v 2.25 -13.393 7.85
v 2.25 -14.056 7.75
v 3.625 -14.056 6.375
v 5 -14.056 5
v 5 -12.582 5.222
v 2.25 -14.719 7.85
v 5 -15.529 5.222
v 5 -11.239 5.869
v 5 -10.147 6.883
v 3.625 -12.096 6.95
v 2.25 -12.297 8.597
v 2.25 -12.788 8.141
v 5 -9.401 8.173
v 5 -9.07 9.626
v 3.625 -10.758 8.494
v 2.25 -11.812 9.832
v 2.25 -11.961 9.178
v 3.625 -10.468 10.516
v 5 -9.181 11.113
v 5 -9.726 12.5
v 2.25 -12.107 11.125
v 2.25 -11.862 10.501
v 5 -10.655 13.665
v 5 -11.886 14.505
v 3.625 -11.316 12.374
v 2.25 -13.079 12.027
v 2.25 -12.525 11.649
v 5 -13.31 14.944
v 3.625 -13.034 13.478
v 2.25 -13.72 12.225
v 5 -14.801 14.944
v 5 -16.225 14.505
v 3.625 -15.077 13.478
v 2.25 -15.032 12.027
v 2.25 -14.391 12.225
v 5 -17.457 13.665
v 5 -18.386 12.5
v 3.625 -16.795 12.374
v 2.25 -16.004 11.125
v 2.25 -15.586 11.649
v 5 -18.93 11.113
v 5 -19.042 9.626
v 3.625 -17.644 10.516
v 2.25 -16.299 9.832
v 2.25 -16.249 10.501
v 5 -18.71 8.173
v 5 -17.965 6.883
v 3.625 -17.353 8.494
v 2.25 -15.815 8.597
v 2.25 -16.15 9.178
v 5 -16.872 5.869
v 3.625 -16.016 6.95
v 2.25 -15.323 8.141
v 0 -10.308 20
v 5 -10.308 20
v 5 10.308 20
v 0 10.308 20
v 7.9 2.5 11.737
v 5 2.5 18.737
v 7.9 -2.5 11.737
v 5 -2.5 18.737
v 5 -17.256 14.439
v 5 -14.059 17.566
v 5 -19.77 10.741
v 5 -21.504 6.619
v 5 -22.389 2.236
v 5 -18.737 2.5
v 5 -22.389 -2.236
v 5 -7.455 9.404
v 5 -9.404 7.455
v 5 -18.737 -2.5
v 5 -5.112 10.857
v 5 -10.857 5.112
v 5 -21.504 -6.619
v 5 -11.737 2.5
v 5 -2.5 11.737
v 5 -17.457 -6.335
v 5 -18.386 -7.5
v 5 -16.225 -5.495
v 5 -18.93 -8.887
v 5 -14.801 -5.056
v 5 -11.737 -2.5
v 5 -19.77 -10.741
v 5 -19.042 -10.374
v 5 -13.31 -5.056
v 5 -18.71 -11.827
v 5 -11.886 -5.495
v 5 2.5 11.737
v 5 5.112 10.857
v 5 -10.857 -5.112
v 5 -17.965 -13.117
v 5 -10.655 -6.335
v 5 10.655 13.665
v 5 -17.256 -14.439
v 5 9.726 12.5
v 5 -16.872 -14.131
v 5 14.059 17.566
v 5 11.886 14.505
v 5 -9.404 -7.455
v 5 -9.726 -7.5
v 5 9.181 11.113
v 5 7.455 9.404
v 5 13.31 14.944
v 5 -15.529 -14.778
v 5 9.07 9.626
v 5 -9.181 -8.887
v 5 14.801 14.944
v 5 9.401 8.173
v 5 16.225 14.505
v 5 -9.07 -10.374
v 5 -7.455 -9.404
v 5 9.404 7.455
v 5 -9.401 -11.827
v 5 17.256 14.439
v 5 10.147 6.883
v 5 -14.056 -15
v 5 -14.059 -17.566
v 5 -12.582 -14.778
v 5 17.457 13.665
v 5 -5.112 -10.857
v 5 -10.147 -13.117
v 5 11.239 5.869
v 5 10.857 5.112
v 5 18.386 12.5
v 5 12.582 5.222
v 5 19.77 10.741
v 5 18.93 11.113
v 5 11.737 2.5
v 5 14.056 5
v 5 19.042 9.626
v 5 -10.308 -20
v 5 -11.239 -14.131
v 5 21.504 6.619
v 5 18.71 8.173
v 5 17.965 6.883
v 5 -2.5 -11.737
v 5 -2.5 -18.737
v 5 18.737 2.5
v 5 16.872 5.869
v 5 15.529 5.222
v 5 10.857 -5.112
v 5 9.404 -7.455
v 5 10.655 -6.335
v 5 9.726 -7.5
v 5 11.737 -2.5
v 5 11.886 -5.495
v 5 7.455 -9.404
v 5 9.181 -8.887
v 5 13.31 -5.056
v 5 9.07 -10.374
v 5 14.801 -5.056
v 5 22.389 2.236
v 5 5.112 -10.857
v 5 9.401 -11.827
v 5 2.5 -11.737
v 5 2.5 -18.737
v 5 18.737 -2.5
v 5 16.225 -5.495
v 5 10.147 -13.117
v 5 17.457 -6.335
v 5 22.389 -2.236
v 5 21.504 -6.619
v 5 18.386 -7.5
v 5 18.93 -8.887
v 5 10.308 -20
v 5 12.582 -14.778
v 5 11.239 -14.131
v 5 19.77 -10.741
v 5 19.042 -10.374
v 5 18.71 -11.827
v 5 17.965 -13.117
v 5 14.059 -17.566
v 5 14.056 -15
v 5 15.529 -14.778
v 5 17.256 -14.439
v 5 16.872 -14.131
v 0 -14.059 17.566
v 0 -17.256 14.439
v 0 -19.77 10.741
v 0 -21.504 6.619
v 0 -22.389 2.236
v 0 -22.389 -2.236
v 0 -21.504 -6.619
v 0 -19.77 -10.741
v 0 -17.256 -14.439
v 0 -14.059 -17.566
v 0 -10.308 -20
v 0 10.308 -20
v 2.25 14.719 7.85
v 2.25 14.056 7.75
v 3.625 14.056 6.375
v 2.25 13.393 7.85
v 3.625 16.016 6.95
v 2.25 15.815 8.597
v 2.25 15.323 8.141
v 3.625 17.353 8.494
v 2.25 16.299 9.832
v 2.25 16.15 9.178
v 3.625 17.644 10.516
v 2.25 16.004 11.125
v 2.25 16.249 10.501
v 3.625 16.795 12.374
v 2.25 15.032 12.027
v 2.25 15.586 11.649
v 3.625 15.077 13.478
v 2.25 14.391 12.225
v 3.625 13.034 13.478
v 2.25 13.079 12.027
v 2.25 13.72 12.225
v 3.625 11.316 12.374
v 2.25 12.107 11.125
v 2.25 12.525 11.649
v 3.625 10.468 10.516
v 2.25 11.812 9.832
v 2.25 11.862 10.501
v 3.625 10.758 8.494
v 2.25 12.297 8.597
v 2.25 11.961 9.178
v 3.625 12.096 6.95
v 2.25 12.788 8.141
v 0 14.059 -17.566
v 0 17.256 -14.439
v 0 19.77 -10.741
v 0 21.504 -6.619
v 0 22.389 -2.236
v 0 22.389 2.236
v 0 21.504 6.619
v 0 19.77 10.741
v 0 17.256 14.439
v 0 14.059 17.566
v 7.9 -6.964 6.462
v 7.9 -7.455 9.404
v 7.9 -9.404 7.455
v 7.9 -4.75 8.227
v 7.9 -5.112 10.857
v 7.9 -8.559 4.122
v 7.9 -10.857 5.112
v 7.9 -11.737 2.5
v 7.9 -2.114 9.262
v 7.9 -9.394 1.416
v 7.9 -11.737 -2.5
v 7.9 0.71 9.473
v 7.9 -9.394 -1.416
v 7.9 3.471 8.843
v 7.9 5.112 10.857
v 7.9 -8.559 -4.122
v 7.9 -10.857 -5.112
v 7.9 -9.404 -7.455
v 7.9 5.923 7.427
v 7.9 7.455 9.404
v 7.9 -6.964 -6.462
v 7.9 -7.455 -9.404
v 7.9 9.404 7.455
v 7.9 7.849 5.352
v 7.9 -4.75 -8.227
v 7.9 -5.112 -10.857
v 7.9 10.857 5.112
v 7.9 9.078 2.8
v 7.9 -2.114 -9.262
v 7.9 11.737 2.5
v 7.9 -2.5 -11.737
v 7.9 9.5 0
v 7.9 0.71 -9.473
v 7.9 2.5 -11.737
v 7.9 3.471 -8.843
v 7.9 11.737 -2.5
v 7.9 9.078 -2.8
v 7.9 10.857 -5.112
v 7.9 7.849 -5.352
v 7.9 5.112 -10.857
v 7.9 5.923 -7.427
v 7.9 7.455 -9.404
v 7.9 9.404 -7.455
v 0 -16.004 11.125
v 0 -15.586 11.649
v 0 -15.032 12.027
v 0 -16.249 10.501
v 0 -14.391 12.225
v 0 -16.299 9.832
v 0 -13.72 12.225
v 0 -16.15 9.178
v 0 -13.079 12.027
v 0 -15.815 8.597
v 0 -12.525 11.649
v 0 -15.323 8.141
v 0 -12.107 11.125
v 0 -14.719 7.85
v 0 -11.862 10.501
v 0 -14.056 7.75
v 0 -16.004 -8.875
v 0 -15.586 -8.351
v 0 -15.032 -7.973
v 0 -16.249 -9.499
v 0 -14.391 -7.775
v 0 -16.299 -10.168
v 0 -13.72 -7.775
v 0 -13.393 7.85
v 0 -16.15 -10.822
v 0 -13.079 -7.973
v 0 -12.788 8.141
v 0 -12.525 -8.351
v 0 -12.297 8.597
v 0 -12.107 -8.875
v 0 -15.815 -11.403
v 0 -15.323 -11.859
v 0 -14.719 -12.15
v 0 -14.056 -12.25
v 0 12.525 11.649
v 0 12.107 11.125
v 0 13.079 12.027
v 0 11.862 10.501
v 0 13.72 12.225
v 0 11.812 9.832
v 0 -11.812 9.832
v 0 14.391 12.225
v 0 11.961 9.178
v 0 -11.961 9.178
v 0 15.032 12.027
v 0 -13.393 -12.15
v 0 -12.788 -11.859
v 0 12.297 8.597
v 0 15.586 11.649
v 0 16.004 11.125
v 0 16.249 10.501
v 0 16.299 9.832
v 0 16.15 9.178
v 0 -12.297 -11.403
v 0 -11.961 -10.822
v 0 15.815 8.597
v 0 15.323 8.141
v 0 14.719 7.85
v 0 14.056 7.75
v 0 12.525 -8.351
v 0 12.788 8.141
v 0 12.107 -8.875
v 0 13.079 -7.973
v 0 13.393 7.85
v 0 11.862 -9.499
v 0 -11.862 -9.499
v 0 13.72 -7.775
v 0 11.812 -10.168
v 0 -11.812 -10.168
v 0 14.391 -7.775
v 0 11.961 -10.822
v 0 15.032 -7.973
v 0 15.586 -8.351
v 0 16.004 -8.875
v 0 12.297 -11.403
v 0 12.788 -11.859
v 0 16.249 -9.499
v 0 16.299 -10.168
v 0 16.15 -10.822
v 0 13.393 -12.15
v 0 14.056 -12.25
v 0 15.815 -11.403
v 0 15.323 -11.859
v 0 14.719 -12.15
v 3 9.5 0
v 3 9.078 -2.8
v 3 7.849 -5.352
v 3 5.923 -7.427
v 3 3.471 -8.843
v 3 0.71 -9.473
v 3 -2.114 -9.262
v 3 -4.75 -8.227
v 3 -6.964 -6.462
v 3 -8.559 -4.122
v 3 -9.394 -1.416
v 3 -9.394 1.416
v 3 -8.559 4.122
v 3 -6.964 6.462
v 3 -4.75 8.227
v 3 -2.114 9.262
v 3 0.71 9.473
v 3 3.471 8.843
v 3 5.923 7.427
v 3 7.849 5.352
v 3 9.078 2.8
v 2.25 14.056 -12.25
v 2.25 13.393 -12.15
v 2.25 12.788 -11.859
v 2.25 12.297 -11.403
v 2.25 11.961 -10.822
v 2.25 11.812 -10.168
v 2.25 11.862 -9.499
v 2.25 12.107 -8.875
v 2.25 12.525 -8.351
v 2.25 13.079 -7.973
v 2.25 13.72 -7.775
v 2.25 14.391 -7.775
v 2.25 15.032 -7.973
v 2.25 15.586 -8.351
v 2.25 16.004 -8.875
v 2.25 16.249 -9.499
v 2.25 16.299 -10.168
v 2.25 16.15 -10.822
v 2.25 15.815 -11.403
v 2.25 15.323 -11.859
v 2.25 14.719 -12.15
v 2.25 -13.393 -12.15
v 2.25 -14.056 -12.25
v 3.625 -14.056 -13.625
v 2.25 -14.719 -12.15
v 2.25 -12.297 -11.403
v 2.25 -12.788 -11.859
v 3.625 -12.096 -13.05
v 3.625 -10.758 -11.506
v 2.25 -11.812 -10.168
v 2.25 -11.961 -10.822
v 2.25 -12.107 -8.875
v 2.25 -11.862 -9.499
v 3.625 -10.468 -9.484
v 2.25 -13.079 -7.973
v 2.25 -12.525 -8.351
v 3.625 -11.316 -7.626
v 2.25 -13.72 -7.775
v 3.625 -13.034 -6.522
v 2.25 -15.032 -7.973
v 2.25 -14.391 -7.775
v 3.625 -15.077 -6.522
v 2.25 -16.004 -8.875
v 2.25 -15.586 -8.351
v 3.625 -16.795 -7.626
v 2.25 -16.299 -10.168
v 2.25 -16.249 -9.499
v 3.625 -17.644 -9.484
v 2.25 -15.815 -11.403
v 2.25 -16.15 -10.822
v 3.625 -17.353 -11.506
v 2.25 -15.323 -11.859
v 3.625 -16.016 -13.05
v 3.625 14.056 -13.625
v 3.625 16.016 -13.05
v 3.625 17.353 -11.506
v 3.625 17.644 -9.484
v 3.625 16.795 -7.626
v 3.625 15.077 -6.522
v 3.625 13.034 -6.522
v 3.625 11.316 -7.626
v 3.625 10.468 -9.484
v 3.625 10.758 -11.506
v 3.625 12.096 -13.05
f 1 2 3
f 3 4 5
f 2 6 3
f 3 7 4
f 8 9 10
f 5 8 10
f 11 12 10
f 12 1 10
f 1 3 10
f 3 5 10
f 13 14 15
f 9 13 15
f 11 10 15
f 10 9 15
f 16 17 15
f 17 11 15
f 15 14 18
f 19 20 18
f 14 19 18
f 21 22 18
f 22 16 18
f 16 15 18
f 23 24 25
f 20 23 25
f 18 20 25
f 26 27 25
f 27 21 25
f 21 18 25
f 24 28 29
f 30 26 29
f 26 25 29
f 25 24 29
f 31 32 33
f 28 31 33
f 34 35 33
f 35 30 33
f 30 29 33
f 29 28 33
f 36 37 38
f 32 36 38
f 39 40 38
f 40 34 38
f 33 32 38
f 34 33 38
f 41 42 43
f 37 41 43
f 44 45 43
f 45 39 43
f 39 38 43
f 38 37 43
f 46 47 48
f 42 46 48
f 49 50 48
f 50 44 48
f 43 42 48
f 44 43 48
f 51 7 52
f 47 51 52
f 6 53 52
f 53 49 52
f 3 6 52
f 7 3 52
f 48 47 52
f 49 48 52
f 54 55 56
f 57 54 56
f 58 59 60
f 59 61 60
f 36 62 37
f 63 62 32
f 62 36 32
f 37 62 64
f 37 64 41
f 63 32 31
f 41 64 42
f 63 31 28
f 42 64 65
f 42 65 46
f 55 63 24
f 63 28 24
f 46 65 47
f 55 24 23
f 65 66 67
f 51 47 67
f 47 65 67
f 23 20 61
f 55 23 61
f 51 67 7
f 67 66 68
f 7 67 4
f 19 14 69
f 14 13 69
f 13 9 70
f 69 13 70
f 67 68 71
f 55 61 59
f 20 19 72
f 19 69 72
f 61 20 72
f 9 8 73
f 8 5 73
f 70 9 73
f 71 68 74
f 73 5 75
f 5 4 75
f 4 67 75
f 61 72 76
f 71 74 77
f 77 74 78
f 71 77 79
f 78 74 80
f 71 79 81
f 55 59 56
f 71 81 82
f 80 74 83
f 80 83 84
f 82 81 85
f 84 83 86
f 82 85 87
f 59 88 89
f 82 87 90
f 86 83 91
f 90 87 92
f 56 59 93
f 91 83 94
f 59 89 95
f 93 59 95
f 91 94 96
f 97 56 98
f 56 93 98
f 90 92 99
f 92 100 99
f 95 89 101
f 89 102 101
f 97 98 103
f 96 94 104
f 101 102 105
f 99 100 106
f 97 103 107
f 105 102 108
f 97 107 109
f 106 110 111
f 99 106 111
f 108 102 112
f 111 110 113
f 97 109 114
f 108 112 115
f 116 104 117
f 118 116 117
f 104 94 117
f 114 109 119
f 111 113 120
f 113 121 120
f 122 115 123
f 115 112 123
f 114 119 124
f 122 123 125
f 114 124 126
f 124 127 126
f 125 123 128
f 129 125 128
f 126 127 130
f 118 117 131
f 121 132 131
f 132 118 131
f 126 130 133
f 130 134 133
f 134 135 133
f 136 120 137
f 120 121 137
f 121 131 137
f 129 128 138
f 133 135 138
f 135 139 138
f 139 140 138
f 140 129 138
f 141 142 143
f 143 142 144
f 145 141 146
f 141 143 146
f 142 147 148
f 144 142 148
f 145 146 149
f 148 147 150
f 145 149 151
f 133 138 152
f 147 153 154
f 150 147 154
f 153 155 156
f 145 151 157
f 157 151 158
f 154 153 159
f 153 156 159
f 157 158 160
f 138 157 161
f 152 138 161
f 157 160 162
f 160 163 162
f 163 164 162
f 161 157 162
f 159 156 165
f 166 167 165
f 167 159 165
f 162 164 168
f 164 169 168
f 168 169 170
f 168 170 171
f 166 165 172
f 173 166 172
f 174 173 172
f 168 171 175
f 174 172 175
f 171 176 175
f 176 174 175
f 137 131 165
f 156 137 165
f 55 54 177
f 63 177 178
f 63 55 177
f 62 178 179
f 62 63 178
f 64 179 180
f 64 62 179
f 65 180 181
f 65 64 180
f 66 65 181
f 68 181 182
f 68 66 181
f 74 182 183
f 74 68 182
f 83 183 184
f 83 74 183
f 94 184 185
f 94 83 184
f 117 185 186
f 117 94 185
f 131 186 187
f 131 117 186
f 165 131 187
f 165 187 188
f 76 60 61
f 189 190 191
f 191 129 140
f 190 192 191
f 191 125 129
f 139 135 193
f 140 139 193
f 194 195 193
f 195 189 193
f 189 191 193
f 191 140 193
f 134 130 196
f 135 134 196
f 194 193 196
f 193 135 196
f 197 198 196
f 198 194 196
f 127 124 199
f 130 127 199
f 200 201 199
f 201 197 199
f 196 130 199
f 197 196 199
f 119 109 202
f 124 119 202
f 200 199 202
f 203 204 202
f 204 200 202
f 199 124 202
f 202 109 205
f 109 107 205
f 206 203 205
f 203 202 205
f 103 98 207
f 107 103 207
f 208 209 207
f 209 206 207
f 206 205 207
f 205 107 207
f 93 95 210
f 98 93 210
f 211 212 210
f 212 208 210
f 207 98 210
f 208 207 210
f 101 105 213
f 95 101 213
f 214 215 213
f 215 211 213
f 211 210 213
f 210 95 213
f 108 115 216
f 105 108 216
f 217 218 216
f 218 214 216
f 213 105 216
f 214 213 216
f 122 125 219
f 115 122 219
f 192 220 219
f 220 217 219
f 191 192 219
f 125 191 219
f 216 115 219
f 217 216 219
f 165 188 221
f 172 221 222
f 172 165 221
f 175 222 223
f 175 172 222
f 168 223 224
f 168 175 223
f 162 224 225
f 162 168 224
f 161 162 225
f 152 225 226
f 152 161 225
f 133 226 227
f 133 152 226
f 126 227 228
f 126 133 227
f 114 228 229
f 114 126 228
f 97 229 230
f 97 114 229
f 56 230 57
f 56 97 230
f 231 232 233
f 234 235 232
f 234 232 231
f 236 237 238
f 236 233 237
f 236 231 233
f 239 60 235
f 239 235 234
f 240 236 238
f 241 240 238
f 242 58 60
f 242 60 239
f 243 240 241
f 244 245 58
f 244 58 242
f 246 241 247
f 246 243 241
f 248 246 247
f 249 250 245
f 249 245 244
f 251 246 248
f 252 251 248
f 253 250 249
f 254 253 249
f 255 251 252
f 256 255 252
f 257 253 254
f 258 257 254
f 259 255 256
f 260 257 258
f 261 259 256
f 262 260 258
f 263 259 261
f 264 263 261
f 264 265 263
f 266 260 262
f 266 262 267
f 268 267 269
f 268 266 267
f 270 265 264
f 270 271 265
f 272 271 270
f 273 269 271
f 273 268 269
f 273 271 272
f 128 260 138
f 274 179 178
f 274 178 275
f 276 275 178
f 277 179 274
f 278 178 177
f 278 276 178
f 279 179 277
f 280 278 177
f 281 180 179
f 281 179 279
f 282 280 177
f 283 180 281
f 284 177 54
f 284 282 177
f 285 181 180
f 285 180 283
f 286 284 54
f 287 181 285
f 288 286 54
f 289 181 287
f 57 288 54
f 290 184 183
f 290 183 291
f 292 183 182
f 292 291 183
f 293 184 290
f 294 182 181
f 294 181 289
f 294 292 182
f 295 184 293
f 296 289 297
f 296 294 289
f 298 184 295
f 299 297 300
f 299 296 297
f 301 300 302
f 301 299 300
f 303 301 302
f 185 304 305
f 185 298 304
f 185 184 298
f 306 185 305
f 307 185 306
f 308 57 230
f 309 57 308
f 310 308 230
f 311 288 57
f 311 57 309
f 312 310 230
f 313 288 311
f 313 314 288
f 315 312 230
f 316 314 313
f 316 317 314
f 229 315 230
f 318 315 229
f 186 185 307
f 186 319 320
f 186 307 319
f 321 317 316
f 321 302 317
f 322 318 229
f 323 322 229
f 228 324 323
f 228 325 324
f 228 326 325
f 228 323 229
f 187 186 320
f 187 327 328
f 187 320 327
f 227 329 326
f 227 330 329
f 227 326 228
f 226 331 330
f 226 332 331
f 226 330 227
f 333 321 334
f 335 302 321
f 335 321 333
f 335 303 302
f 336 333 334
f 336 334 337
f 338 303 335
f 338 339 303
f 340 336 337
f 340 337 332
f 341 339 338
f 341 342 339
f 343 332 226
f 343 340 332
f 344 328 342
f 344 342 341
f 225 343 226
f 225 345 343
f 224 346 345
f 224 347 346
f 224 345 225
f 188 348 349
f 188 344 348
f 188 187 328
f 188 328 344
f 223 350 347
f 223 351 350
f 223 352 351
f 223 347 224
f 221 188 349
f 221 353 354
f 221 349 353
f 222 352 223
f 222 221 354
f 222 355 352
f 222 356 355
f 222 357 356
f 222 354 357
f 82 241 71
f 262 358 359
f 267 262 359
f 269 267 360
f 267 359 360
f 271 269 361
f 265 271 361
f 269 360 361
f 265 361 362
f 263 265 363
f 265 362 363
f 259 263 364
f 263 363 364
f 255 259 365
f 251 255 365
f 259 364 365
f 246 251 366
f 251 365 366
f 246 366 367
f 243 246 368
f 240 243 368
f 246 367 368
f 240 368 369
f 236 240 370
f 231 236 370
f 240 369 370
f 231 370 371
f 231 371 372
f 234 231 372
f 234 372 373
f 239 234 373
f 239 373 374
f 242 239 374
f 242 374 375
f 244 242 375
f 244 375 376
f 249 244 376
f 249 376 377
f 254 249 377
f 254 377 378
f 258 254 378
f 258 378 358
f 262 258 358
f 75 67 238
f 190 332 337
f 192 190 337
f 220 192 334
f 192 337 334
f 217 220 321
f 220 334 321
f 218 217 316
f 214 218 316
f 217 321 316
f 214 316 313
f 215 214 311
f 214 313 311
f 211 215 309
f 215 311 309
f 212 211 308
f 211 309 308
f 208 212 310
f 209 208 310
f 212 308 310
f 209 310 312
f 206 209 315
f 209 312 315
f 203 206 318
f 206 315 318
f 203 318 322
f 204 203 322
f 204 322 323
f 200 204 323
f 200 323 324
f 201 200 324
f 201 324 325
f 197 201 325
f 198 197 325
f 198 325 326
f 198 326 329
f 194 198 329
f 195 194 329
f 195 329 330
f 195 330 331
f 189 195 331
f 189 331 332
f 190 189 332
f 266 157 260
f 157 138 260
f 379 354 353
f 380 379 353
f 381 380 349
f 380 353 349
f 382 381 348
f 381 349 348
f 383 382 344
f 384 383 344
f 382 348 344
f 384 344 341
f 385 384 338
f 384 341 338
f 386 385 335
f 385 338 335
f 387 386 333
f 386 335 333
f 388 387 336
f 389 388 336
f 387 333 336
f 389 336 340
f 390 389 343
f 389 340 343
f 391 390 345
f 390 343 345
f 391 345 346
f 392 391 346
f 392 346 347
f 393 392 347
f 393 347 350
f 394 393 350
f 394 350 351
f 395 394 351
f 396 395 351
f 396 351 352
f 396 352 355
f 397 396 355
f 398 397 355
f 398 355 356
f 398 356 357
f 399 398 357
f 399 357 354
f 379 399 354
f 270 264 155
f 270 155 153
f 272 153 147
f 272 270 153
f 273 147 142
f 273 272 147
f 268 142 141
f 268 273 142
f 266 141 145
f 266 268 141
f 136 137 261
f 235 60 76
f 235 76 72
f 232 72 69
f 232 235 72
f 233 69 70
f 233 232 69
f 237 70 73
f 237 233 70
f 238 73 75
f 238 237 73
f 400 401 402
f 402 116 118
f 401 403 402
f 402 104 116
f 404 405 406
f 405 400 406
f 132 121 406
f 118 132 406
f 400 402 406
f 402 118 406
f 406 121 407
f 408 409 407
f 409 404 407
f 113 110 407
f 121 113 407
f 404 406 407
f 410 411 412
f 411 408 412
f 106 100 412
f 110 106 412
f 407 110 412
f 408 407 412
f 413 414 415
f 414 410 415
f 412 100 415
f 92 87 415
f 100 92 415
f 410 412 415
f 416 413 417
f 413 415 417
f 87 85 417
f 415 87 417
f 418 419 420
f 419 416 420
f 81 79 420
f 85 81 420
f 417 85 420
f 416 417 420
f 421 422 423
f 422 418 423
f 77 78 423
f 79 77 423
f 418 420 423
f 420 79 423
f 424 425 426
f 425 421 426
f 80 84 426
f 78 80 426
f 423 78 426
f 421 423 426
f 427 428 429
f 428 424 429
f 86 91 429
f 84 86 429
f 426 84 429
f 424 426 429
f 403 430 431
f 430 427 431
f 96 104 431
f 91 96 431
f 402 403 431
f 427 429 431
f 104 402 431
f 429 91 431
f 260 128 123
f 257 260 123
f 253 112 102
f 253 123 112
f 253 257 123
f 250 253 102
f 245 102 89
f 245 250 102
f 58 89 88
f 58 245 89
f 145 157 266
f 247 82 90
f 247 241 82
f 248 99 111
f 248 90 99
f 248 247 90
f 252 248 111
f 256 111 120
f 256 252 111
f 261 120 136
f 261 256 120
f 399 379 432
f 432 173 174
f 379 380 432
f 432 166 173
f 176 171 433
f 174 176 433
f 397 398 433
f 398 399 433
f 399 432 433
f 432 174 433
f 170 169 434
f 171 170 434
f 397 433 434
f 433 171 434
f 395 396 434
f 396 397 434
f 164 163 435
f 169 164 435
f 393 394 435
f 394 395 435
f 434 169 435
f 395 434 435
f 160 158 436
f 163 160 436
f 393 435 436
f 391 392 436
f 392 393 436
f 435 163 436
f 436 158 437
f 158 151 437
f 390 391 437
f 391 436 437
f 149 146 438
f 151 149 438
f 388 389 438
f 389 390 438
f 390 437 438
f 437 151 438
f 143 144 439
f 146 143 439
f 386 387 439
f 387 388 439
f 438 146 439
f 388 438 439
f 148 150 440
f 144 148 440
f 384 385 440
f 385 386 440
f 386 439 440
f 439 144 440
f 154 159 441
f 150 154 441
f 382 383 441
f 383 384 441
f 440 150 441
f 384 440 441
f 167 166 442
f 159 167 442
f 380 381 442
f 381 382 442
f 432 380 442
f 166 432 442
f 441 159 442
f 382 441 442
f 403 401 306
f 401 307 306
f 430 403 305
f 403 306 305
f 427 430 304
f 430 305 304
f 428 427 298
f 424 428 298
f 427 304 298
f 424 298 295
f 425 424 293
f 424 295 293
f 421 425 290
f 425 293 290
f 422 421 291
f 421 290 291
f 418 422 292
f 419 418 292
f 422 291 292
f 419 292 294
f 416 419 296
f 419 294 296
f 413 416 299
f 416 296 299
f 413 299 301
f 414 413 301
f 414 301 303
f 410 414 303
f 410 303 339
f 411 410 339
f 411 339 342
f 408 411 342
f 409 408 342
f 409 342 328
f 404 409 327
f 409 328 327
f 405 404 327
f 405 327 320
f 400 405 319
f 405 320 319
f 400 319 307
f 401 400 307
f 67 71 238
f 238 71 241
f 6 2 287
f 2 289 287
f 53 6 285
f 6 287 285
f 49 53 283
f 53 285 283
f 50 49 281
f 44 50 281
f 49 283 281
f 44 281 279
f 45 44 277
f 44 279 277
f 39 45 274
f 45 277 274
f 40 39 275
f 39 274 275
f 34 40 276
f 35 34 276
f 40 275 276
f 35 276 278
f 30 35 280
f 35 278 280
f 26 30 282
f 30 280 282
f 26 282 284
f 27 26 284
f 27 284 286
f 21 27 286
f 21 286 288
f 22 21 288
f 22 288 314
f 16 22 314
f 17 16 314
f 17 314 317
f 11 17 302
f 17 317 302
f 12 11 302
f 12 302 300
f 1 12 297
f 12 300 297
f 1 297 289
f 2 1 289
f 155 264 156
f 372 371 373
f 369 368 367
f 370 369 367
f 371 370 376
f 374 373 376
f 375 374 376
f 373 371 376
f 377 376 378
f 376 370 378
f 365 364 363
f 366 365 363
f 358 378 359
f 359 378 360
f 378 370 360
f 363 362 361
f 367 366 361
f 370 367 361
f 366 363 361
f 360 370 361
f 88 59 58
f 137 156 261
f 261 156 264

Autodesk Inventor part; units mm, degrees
ref_plane "YZ Plane" through (0, 0, 0) normal (1, 0, 0) x (0, 1, 0)
ref_plane "XZ Plane" through (0, 0, 0) normal (0, 1, 0) x (-1, 0, 0)
ref_plane "XY Plane" through (0, 0, 0) normal (0, 0, 1) x (1, 0, 0)
sketch "Skizze1" plane through (0, 0, 0) normal (0, 0, 1) x (1, 0, 0)
  line L0 (0, 0) -> (0, 22.5)
  line L1 (0, 22.5) -> (5, 22.5)
  line L2 (5, 22.5) -> (5, 12)
  line L3 (5, 12) -> (7.9, 12)
  line L4 (7.9, 12) -> (7.9, 9.5)
  line L5 (7.9, 9.5) -> (3, 9.5)
  line L6 (3, 9.5) -> (3, 0)
  line L7 (3, 0) -> (0, 0)
  line L8 (5, 17.25) -> (0, 17.25) construction
  line L9 (0, 18.75) -> (5, 18.75) construction
  line L10 (0, 15.75) -> (5, 15.75) construction
  line L11 (9, 12) -> (9, 0) construction
  line L12 (5, 12) -> (5, 0) construction
  dimension "d0" = 19
  dimension "d3" = 5
  dimension "d5" = 3
  dimension "d6" = 1.5
  dimension "d7" = 3.75
  dimension "d17" = 2.5
  dimension "d18" = 24
  dimension "d31" = 1.1
  dimension "d32" = 4
  dimension "d33" = 2
  dimension "d34" = 3
  dimension "DrivenPart_Flansch_TotalThickness" = 9
  dimension "d41" = 45
  dimension "FixationHole_Dia" = 34.5
revolve "Umdrehung1" add sketch "Skizze1" angle 360 about axis through (3, 0, 0) along (-1, 0, 0)
sketch "Skizze4" plane through (5, 0, 0) normal (1, 0, 0) x (0, -1, 0)
  line L0 (-14.0557, 10) -> (14.0557, 10) construction
  line L1 (14.0557, 10) -> (14.0557, -10) construction
  line L2 (14.0557, -10) -> (-14.0557, -10) construction
  line L3 (-14.0557, -10) -> (-14.0557, 10) construction
  circle A0 centre (0, 0) radius 12 construction
  line L4 (-14.0557, 10) -> (14.0557, -10) construction
  line L5 (14.0557, 10) -> (-14.0557, -10) construction
  circle A1 centre (0, 0) radius 17.25 construction
  arc A2 (-22.5, 0) -> (-22.5, 0) centre (0, 0) ccw construction
  circle A3 centre (0, 0) radius 22.5 construction
  dimension "d40" = 45
  dimension "d43" = 34.5
  dimension "d38" = 20
  dimension "d39" = 24
hole "Bohrung2" at (5, 14.0557, 10) at (5, 14.0557, -10) at (5, -14.0557, 10) at (5, -14.0557, -10) direction (-1, 0, 0) diameter 4.5 end through all countersink diameter 10 countersink angle 90 clearance for "Innensechskant-Senkkopfschraube DIN EN ISO 10642" size "M4" standard "DIN"
sketch "Skizze5" plane through (5, 0, 0) normal (1, 0, 0) x (0, 0, -1)
  circle A0 centre (0, 0) radius 22.5 projected
  circle A1 centre (0, 0) radius 22.5 projected
  line L0 (-20, -10.3078) -> (-20, 10.3078)
  line L1 (20, -10.3078) -> (20, 10.3078)
  point P0 (0, 0)
  dimension "d51" = 40
extrude "Extrusion2" cut sketch "Skizze5" against normal through all contours A0 L1 | L0 A0
sketch "Skizze6" plane through (7.9, 0, 0) normal (1, 0, 0) x (0, 0, -1)
  line L0 (-2.5, 18.7367) -> (2.5, 18.7367)
  line L1 (2.5, 18.7367) -> (2.5, 11.7367)
  line L2 (2.5, 11.7367) -> (-2.5, 11.7367)
  line L3 (-2.5, 11.7367) -> (-2.5, 18.7367)
  line L4 (0, 0) -> (0, 18.7367) construction
  circle A0 centre (0, 0) radius 12 projected
  dimension "d54" = 5
  dimension "d55" = 7
extrude "Extrusion3" add sketch "Skizze6" against normal up to surface (2.9 mm away) contours L0 L1 A0 L3
sketch "Skizze7" plane through (7.9, 11.7367, 2.5) normal (0, 0, 1) x (1, 0, 0)
  line L0 (0, 7) -> (-2.9, 7) projected
  line L1 (0, 0) -> (-2.9, 0) projected
  line L2 (-2.9, 7) -> (0, 0)
  line L3 (0, 7) -> (0, 0) projected
  point P0 (-7.9, -11.7367)
extrude "Extrusion4" cut sketch "Skizze7" against normal through all
pattern_circular "Runde Anordnung1" count 4 over 360 about axis through (5.45, 0, 0) along (1, 0, 0) of "Extrusion3", "Extrusion4"
equation "\"d43\" = FixationHole_Dia"
equation "\"d6\" = 0.5 * d5"
properties part number "ParallelMecha_DrivenLink_ShaftFixation" material "Aluminium 6061"
